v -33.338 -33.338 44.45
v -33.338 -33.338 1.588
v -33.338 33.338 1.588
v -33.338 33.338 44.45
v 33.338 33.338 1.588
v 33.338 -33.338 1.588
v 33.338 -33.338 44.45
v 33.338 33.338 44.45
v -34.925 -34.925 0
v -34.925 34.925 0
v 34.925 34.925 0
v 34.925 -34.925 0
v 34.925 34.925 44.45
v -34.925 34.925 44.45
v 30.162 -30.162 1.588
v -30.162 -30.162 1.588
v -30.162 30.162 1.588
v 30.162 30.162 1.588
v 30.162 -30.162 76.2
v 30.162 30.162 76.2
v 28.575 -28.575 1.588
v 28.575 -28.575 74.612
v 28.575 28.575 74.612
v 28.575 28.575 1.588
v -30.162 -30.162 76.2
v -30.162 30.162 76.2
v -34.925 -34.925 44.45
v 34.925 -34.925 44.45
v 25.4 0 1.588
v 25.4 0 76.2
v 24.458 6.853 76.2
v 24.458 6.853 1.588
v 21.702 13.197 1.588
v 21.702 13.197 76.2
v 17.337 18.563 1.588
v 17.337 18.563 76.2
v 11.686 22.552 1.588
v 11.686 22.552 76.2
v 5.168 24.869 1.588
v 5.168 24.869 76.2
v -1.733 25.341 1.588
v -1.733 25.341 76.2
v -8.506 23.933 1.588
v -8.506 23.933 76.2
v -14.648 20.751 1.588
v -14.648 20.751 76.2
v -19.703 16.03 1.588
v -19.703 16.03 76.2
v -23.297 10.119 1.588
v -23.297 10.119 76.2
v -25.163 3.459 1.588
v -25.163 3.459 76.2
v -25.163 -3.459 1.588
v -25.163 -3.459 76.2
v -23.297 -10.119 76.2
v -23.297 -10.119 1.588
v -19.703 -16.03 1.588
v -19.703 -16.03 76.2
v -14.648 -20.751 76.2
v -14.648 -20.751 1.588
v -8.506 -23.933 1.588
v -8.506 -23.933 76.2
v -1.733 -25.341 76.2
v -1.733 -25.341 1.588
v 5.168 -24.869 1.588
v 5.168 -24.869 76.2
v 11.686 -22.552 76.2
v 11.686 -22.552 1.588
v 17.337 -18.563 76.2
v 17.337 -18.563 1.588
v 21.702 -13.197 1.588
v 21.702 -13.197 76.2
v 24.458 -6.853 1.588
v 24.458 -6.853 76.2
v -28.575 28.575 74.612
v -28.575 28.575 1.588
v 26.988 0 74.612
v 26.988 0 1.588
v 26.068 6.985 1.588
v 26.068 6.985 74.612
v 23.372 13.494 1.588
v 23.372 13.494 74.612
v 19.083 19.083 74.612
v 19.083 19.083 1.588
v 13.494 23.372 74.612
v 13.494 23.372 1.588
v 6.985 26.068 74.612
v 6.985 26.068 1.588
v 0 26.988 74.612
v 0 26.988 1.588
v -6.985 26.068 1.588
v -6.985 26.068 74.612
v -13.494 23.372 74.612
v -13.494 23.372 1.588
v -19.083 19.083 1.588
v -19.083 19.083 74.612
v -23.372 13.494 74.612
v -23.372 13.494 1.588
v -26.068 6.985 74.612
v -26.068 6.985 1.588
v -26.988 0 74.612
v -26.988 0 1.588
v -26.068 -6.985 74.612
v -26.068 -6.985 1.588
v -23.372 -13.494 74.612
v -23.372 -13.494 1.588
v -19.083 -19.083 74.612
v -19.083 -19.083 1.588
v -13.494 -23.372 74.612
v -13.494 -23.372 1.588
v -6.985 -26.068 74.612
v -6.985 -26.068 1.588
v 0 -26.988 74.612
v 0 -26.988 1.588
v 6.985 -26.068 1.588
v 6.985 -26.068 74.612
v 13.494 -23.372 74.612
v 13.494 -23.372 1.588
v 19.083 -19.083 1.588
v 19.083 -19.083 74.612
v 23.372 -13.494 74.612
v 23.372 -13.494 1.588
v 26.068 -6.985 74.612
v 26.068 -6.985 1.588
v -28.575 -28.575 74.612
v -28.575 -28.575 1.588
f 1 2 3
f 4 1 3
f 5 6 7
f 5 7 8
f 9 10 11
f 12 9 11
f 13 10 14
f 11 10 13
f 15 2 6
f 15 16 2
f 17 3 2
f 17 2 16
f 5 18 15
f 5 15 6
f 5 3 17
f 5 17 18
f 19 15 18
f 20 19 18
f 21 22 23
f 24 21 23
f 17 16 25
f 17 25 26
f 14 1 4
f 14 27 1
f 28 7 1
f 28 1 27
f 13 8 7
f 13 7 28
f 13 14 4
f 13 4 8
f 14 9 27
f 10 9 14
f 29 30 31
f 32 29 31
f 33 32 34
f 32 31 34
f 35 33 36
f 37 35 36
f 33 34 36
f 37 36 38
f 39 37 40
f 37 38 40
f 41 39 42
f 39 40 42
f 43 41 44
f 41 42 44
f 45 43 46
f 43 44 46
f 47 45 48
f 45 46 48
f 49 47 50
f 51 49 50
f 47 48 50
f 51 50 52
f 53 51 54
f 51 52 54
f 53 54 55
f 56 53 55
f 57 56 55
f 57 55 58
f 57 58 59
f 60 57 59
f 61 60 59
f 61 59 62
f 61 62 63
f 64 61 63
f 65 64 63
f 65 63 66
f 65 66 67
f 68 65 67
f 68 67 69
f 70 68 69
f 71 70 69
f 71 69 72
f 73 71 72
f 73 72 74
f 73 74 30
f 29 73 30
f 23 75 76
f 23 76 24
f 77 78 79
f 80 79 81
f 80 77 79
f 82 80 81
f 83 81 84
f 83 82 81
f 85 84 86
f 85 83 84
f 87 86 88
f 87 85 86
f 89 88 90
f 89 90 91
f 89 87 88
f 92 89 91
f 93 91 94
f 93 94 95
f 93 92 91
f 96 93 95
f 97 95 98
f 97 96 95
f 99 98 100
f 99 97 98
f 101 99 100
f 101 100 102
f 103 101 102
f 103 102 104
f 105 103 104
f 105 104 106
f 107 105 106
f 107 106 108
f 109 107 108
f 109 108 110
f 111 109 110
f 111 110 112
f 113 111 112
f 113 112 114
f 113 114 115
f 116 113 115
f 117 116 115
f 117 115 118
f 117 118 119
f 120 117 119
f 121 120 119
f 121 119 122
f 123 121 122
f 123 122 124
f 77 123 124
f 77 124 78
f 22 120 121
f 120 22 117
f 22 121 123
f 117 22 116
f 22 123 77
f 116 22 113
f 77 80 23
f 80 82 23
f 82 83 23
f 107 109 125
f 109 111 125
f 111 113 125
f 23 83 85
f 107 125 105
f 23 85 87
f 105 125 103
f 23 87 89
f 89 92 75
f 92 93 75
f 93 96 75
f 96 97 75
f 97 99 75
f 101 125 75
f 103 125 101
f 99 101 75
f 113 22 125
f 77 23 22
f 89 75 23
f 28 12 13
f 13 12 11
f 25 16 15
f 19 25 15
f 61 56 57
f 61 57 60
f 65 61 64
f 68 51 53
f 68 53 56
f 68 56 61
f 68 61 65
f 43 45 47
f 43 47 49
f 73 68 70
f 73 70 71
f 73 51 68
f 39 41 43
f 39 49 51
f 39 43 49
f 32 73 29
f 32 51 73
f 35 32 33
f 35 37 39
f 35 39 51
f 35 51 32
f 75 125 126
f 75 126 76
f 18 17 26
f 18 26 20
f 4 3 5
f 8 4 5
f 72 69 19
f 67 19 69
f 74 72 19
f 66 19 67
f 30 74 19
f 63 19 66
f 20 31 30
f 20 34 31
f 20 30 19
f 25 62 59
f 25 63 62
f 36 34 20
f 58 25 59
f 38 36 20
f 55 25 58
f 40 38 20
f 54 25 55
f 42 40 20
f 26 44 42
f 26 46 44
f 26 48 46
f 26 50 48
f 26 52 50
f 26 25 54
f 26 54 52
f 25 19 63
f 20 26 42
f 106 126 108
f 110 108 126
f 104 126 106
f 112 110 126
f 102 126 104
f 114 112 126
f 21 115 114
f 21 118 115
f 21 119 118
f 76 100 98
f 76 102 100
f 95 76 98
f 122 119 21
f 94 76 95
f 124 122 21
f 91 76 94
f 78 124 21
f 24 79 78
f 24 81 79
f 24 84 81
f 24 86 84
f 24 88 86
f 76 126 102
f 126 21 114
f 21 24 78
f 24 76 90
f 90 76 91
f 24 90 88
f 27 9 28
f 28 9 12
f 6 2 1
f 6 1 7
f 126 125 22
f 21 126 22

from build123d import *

# Parameters (mm, degrees)
F0_W      = 69.85
F0_H      = 69.85
F1_DEPTH  = 1.5875
F2_W      = 69.85
F2_H      = 69.85
F2_W_2    = 66.675
F2_H_2    = 66.675
F3_DEPTH  = 42.8625
F4_W      = 60.325
F4_H      = 60.325
F4_W_2    = 57.15
F4_H_2    = 57.15
F5_DEPTH  = 74.6125
F6_W      = 57.15
F6_H      = 1.5875
F7_DEPTH  = 58.7375
F8_R      = 25.4
F9_DEPTH  = 74.6125
F10_R     = 26.9875
F10_R_2   = 25.4
F11_DEPTH = 76.2


with BuildPart() as f1:
    # F0 (on Top) → F1 (new body)
    with BuildSketch(Plane.XY):
        Rectangle(F0_W, F0_H)
    extrude(amount=F1_DEPTH)

    # F2 (on face) → F3 (join)
    with BuildSketch(Plane.XY.offset(1.5875)):
        Rectangle(F2_W, F2_H)
        Rectangle(F2_W_2, F2_H_2, mode=Mode.SUBTRACT)
    extrude(amount=F3_DEPTH)

    # F4 (on face) → F5 (join)
    with BuildSketch(Plane.XY.offset(1.5875)):
        Rectangle(F4_W, F4_H)
        Rectangle(F4_W_2, F4_H_2, mode=Mode.SUBTRACT)
    extrude(amount=F5_DEPTH)

    # F6 (on face) → F7 (join)
    with BuildSketch(Plane.YZ.offset(-28.575)):
        with Locations((0, 75.40625)):
            Rectangle(F6_W, F6_H)
    extrude(amount=F7_DEPTH)

    # F8 (on face) → F9 (cut)
    with BuildSketch(Plane.XY.offset(76.2)):
        Circle(F8_R)
    extrude(amount=-F9_DEPTH, mode=Mode.SUBTRACT)

    # F10 (on face) → F11 (join)
    with BuildSketch(Plane.XY.offset(76.2)):
        Circle(F10_R)
        Circle(F10_R_2, mode=Mode.SUBTRACT)
    extrude(amount=-F11_DEPTH)


solid = f1.part
